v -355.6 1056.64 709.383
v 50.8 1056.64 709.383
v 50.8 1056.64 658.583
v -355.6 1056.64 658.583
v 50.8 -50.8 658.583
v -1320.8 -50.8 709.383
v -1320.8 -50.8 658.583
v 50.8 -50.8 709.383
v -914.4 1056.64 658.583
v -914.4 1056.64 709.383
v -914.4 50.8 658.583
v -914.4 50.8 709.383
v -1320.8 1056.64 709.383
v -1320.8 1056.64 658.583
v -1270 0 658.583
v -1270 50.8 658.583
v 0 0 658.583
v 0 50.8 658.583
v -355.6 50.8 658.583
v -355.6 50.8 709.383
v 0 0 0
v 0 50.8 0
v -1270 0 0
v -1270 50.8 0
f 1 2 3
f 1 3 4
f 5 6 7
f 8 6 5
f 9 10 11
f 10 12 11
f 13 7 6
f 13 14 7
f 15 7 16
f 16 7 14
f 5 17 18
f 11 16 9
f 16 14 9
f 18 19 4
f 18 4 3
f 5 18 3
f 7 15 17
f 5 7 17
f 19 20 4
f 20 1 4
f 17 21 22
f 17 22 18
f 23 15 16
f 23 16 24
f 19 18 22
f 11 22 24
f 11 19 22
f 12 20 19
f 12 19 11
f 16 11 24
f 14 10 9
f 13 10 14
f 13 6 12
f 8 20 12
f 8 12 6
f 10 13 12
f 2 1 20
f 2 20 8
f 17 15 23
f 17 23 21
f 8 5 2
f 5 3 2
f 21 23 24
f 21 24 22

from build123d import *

# Parameters (mm, degrees)
F0_W      = 50.8
F0_H      = 50.8
F1_DEPTH  = 1005.84
F3_DEPTH  = 50.8
F4_W      = 1371.6
F4_H      = 50.8
F5_DEPTH  = 50.8
F11_DEPTH = 955.04


# Not quite as in the source:
# - a feature of the source that left no trace in its solid (it failed there, or was rolled back) is left out


with BuildPart() as f1:
    # F0 (on Front) → F1 (new body)
    with BuildSketch(Plane.XZ):
        with Locations((-1295.4, 683.9833942235)):
            Rectangle(F0_W, F0_H)
        with Locations((25.4, 683.9833942235)):
            Rectangle(F0_W, F0_H)
        Polygon((-1270, 0), (0, 0), (0, 658.5833942235), (0, 709.3833942235), (-1270, 709.3833942235), (-1270, 658.5833942235), align=None)
    extrude(amount=-F1_DEPTH)

    # F2 (on face) → F3 (join)
    with BuildSketch(Plane(origin=(0, 1005.84, 0), x_dir=(-1, 0, 0), z_dir=(0, 1, 0))):
        Polygon((1320.8, 709.3833942235), (914.4, 709.3833942235), (914.4, 658.5833942235), (1270, 658.5833942235), (1320.8, 658.5833942235), align=None)
        Polygon((-50.8, 709.3833942235), (-50.8, 658.5833942235), (0, 658.5833942235), (355.6, 658.5833942235), (355.6, 709.3833942235), align=None)
    extrude(amount=F3_DEPTH)

    # F4 (on face) → F5 (join)
    with BuildSketch(Plane.XZ):
        with Locations((-635, 683.9833942235)):
            Rectangle(F4_W, F4_H)
    extrude(amount=F5_DEPTH)

    # F10 (on face) → F11 (cut)
    with BuildSketch(Plane(origin=(0, 1005.84, 0), x_dir=(-1, 0, 0), z_dir=(0, 1, 0))):
        Polygon((355.6, 709.3833942235), (355.6, 658.5833942235), (355.6, 113.7688308954), (914.4, 113.7688308954), (914.4, 658.5833942235), (914.4, 709.3833942235), align=None)
        Polygon((355.6, 113.7688308954), (355.6, 658.5833942235), (0, 658.5833942235), (0, 0), (1270, 0), (1270, 658.5833942235), (914.4, 658.5833942235), (914.4, 113.7688308954), align=None)
    extrude(amount=-F11_DEPTH, mode=Mode.SUBTRACT)


solid = f1.part
